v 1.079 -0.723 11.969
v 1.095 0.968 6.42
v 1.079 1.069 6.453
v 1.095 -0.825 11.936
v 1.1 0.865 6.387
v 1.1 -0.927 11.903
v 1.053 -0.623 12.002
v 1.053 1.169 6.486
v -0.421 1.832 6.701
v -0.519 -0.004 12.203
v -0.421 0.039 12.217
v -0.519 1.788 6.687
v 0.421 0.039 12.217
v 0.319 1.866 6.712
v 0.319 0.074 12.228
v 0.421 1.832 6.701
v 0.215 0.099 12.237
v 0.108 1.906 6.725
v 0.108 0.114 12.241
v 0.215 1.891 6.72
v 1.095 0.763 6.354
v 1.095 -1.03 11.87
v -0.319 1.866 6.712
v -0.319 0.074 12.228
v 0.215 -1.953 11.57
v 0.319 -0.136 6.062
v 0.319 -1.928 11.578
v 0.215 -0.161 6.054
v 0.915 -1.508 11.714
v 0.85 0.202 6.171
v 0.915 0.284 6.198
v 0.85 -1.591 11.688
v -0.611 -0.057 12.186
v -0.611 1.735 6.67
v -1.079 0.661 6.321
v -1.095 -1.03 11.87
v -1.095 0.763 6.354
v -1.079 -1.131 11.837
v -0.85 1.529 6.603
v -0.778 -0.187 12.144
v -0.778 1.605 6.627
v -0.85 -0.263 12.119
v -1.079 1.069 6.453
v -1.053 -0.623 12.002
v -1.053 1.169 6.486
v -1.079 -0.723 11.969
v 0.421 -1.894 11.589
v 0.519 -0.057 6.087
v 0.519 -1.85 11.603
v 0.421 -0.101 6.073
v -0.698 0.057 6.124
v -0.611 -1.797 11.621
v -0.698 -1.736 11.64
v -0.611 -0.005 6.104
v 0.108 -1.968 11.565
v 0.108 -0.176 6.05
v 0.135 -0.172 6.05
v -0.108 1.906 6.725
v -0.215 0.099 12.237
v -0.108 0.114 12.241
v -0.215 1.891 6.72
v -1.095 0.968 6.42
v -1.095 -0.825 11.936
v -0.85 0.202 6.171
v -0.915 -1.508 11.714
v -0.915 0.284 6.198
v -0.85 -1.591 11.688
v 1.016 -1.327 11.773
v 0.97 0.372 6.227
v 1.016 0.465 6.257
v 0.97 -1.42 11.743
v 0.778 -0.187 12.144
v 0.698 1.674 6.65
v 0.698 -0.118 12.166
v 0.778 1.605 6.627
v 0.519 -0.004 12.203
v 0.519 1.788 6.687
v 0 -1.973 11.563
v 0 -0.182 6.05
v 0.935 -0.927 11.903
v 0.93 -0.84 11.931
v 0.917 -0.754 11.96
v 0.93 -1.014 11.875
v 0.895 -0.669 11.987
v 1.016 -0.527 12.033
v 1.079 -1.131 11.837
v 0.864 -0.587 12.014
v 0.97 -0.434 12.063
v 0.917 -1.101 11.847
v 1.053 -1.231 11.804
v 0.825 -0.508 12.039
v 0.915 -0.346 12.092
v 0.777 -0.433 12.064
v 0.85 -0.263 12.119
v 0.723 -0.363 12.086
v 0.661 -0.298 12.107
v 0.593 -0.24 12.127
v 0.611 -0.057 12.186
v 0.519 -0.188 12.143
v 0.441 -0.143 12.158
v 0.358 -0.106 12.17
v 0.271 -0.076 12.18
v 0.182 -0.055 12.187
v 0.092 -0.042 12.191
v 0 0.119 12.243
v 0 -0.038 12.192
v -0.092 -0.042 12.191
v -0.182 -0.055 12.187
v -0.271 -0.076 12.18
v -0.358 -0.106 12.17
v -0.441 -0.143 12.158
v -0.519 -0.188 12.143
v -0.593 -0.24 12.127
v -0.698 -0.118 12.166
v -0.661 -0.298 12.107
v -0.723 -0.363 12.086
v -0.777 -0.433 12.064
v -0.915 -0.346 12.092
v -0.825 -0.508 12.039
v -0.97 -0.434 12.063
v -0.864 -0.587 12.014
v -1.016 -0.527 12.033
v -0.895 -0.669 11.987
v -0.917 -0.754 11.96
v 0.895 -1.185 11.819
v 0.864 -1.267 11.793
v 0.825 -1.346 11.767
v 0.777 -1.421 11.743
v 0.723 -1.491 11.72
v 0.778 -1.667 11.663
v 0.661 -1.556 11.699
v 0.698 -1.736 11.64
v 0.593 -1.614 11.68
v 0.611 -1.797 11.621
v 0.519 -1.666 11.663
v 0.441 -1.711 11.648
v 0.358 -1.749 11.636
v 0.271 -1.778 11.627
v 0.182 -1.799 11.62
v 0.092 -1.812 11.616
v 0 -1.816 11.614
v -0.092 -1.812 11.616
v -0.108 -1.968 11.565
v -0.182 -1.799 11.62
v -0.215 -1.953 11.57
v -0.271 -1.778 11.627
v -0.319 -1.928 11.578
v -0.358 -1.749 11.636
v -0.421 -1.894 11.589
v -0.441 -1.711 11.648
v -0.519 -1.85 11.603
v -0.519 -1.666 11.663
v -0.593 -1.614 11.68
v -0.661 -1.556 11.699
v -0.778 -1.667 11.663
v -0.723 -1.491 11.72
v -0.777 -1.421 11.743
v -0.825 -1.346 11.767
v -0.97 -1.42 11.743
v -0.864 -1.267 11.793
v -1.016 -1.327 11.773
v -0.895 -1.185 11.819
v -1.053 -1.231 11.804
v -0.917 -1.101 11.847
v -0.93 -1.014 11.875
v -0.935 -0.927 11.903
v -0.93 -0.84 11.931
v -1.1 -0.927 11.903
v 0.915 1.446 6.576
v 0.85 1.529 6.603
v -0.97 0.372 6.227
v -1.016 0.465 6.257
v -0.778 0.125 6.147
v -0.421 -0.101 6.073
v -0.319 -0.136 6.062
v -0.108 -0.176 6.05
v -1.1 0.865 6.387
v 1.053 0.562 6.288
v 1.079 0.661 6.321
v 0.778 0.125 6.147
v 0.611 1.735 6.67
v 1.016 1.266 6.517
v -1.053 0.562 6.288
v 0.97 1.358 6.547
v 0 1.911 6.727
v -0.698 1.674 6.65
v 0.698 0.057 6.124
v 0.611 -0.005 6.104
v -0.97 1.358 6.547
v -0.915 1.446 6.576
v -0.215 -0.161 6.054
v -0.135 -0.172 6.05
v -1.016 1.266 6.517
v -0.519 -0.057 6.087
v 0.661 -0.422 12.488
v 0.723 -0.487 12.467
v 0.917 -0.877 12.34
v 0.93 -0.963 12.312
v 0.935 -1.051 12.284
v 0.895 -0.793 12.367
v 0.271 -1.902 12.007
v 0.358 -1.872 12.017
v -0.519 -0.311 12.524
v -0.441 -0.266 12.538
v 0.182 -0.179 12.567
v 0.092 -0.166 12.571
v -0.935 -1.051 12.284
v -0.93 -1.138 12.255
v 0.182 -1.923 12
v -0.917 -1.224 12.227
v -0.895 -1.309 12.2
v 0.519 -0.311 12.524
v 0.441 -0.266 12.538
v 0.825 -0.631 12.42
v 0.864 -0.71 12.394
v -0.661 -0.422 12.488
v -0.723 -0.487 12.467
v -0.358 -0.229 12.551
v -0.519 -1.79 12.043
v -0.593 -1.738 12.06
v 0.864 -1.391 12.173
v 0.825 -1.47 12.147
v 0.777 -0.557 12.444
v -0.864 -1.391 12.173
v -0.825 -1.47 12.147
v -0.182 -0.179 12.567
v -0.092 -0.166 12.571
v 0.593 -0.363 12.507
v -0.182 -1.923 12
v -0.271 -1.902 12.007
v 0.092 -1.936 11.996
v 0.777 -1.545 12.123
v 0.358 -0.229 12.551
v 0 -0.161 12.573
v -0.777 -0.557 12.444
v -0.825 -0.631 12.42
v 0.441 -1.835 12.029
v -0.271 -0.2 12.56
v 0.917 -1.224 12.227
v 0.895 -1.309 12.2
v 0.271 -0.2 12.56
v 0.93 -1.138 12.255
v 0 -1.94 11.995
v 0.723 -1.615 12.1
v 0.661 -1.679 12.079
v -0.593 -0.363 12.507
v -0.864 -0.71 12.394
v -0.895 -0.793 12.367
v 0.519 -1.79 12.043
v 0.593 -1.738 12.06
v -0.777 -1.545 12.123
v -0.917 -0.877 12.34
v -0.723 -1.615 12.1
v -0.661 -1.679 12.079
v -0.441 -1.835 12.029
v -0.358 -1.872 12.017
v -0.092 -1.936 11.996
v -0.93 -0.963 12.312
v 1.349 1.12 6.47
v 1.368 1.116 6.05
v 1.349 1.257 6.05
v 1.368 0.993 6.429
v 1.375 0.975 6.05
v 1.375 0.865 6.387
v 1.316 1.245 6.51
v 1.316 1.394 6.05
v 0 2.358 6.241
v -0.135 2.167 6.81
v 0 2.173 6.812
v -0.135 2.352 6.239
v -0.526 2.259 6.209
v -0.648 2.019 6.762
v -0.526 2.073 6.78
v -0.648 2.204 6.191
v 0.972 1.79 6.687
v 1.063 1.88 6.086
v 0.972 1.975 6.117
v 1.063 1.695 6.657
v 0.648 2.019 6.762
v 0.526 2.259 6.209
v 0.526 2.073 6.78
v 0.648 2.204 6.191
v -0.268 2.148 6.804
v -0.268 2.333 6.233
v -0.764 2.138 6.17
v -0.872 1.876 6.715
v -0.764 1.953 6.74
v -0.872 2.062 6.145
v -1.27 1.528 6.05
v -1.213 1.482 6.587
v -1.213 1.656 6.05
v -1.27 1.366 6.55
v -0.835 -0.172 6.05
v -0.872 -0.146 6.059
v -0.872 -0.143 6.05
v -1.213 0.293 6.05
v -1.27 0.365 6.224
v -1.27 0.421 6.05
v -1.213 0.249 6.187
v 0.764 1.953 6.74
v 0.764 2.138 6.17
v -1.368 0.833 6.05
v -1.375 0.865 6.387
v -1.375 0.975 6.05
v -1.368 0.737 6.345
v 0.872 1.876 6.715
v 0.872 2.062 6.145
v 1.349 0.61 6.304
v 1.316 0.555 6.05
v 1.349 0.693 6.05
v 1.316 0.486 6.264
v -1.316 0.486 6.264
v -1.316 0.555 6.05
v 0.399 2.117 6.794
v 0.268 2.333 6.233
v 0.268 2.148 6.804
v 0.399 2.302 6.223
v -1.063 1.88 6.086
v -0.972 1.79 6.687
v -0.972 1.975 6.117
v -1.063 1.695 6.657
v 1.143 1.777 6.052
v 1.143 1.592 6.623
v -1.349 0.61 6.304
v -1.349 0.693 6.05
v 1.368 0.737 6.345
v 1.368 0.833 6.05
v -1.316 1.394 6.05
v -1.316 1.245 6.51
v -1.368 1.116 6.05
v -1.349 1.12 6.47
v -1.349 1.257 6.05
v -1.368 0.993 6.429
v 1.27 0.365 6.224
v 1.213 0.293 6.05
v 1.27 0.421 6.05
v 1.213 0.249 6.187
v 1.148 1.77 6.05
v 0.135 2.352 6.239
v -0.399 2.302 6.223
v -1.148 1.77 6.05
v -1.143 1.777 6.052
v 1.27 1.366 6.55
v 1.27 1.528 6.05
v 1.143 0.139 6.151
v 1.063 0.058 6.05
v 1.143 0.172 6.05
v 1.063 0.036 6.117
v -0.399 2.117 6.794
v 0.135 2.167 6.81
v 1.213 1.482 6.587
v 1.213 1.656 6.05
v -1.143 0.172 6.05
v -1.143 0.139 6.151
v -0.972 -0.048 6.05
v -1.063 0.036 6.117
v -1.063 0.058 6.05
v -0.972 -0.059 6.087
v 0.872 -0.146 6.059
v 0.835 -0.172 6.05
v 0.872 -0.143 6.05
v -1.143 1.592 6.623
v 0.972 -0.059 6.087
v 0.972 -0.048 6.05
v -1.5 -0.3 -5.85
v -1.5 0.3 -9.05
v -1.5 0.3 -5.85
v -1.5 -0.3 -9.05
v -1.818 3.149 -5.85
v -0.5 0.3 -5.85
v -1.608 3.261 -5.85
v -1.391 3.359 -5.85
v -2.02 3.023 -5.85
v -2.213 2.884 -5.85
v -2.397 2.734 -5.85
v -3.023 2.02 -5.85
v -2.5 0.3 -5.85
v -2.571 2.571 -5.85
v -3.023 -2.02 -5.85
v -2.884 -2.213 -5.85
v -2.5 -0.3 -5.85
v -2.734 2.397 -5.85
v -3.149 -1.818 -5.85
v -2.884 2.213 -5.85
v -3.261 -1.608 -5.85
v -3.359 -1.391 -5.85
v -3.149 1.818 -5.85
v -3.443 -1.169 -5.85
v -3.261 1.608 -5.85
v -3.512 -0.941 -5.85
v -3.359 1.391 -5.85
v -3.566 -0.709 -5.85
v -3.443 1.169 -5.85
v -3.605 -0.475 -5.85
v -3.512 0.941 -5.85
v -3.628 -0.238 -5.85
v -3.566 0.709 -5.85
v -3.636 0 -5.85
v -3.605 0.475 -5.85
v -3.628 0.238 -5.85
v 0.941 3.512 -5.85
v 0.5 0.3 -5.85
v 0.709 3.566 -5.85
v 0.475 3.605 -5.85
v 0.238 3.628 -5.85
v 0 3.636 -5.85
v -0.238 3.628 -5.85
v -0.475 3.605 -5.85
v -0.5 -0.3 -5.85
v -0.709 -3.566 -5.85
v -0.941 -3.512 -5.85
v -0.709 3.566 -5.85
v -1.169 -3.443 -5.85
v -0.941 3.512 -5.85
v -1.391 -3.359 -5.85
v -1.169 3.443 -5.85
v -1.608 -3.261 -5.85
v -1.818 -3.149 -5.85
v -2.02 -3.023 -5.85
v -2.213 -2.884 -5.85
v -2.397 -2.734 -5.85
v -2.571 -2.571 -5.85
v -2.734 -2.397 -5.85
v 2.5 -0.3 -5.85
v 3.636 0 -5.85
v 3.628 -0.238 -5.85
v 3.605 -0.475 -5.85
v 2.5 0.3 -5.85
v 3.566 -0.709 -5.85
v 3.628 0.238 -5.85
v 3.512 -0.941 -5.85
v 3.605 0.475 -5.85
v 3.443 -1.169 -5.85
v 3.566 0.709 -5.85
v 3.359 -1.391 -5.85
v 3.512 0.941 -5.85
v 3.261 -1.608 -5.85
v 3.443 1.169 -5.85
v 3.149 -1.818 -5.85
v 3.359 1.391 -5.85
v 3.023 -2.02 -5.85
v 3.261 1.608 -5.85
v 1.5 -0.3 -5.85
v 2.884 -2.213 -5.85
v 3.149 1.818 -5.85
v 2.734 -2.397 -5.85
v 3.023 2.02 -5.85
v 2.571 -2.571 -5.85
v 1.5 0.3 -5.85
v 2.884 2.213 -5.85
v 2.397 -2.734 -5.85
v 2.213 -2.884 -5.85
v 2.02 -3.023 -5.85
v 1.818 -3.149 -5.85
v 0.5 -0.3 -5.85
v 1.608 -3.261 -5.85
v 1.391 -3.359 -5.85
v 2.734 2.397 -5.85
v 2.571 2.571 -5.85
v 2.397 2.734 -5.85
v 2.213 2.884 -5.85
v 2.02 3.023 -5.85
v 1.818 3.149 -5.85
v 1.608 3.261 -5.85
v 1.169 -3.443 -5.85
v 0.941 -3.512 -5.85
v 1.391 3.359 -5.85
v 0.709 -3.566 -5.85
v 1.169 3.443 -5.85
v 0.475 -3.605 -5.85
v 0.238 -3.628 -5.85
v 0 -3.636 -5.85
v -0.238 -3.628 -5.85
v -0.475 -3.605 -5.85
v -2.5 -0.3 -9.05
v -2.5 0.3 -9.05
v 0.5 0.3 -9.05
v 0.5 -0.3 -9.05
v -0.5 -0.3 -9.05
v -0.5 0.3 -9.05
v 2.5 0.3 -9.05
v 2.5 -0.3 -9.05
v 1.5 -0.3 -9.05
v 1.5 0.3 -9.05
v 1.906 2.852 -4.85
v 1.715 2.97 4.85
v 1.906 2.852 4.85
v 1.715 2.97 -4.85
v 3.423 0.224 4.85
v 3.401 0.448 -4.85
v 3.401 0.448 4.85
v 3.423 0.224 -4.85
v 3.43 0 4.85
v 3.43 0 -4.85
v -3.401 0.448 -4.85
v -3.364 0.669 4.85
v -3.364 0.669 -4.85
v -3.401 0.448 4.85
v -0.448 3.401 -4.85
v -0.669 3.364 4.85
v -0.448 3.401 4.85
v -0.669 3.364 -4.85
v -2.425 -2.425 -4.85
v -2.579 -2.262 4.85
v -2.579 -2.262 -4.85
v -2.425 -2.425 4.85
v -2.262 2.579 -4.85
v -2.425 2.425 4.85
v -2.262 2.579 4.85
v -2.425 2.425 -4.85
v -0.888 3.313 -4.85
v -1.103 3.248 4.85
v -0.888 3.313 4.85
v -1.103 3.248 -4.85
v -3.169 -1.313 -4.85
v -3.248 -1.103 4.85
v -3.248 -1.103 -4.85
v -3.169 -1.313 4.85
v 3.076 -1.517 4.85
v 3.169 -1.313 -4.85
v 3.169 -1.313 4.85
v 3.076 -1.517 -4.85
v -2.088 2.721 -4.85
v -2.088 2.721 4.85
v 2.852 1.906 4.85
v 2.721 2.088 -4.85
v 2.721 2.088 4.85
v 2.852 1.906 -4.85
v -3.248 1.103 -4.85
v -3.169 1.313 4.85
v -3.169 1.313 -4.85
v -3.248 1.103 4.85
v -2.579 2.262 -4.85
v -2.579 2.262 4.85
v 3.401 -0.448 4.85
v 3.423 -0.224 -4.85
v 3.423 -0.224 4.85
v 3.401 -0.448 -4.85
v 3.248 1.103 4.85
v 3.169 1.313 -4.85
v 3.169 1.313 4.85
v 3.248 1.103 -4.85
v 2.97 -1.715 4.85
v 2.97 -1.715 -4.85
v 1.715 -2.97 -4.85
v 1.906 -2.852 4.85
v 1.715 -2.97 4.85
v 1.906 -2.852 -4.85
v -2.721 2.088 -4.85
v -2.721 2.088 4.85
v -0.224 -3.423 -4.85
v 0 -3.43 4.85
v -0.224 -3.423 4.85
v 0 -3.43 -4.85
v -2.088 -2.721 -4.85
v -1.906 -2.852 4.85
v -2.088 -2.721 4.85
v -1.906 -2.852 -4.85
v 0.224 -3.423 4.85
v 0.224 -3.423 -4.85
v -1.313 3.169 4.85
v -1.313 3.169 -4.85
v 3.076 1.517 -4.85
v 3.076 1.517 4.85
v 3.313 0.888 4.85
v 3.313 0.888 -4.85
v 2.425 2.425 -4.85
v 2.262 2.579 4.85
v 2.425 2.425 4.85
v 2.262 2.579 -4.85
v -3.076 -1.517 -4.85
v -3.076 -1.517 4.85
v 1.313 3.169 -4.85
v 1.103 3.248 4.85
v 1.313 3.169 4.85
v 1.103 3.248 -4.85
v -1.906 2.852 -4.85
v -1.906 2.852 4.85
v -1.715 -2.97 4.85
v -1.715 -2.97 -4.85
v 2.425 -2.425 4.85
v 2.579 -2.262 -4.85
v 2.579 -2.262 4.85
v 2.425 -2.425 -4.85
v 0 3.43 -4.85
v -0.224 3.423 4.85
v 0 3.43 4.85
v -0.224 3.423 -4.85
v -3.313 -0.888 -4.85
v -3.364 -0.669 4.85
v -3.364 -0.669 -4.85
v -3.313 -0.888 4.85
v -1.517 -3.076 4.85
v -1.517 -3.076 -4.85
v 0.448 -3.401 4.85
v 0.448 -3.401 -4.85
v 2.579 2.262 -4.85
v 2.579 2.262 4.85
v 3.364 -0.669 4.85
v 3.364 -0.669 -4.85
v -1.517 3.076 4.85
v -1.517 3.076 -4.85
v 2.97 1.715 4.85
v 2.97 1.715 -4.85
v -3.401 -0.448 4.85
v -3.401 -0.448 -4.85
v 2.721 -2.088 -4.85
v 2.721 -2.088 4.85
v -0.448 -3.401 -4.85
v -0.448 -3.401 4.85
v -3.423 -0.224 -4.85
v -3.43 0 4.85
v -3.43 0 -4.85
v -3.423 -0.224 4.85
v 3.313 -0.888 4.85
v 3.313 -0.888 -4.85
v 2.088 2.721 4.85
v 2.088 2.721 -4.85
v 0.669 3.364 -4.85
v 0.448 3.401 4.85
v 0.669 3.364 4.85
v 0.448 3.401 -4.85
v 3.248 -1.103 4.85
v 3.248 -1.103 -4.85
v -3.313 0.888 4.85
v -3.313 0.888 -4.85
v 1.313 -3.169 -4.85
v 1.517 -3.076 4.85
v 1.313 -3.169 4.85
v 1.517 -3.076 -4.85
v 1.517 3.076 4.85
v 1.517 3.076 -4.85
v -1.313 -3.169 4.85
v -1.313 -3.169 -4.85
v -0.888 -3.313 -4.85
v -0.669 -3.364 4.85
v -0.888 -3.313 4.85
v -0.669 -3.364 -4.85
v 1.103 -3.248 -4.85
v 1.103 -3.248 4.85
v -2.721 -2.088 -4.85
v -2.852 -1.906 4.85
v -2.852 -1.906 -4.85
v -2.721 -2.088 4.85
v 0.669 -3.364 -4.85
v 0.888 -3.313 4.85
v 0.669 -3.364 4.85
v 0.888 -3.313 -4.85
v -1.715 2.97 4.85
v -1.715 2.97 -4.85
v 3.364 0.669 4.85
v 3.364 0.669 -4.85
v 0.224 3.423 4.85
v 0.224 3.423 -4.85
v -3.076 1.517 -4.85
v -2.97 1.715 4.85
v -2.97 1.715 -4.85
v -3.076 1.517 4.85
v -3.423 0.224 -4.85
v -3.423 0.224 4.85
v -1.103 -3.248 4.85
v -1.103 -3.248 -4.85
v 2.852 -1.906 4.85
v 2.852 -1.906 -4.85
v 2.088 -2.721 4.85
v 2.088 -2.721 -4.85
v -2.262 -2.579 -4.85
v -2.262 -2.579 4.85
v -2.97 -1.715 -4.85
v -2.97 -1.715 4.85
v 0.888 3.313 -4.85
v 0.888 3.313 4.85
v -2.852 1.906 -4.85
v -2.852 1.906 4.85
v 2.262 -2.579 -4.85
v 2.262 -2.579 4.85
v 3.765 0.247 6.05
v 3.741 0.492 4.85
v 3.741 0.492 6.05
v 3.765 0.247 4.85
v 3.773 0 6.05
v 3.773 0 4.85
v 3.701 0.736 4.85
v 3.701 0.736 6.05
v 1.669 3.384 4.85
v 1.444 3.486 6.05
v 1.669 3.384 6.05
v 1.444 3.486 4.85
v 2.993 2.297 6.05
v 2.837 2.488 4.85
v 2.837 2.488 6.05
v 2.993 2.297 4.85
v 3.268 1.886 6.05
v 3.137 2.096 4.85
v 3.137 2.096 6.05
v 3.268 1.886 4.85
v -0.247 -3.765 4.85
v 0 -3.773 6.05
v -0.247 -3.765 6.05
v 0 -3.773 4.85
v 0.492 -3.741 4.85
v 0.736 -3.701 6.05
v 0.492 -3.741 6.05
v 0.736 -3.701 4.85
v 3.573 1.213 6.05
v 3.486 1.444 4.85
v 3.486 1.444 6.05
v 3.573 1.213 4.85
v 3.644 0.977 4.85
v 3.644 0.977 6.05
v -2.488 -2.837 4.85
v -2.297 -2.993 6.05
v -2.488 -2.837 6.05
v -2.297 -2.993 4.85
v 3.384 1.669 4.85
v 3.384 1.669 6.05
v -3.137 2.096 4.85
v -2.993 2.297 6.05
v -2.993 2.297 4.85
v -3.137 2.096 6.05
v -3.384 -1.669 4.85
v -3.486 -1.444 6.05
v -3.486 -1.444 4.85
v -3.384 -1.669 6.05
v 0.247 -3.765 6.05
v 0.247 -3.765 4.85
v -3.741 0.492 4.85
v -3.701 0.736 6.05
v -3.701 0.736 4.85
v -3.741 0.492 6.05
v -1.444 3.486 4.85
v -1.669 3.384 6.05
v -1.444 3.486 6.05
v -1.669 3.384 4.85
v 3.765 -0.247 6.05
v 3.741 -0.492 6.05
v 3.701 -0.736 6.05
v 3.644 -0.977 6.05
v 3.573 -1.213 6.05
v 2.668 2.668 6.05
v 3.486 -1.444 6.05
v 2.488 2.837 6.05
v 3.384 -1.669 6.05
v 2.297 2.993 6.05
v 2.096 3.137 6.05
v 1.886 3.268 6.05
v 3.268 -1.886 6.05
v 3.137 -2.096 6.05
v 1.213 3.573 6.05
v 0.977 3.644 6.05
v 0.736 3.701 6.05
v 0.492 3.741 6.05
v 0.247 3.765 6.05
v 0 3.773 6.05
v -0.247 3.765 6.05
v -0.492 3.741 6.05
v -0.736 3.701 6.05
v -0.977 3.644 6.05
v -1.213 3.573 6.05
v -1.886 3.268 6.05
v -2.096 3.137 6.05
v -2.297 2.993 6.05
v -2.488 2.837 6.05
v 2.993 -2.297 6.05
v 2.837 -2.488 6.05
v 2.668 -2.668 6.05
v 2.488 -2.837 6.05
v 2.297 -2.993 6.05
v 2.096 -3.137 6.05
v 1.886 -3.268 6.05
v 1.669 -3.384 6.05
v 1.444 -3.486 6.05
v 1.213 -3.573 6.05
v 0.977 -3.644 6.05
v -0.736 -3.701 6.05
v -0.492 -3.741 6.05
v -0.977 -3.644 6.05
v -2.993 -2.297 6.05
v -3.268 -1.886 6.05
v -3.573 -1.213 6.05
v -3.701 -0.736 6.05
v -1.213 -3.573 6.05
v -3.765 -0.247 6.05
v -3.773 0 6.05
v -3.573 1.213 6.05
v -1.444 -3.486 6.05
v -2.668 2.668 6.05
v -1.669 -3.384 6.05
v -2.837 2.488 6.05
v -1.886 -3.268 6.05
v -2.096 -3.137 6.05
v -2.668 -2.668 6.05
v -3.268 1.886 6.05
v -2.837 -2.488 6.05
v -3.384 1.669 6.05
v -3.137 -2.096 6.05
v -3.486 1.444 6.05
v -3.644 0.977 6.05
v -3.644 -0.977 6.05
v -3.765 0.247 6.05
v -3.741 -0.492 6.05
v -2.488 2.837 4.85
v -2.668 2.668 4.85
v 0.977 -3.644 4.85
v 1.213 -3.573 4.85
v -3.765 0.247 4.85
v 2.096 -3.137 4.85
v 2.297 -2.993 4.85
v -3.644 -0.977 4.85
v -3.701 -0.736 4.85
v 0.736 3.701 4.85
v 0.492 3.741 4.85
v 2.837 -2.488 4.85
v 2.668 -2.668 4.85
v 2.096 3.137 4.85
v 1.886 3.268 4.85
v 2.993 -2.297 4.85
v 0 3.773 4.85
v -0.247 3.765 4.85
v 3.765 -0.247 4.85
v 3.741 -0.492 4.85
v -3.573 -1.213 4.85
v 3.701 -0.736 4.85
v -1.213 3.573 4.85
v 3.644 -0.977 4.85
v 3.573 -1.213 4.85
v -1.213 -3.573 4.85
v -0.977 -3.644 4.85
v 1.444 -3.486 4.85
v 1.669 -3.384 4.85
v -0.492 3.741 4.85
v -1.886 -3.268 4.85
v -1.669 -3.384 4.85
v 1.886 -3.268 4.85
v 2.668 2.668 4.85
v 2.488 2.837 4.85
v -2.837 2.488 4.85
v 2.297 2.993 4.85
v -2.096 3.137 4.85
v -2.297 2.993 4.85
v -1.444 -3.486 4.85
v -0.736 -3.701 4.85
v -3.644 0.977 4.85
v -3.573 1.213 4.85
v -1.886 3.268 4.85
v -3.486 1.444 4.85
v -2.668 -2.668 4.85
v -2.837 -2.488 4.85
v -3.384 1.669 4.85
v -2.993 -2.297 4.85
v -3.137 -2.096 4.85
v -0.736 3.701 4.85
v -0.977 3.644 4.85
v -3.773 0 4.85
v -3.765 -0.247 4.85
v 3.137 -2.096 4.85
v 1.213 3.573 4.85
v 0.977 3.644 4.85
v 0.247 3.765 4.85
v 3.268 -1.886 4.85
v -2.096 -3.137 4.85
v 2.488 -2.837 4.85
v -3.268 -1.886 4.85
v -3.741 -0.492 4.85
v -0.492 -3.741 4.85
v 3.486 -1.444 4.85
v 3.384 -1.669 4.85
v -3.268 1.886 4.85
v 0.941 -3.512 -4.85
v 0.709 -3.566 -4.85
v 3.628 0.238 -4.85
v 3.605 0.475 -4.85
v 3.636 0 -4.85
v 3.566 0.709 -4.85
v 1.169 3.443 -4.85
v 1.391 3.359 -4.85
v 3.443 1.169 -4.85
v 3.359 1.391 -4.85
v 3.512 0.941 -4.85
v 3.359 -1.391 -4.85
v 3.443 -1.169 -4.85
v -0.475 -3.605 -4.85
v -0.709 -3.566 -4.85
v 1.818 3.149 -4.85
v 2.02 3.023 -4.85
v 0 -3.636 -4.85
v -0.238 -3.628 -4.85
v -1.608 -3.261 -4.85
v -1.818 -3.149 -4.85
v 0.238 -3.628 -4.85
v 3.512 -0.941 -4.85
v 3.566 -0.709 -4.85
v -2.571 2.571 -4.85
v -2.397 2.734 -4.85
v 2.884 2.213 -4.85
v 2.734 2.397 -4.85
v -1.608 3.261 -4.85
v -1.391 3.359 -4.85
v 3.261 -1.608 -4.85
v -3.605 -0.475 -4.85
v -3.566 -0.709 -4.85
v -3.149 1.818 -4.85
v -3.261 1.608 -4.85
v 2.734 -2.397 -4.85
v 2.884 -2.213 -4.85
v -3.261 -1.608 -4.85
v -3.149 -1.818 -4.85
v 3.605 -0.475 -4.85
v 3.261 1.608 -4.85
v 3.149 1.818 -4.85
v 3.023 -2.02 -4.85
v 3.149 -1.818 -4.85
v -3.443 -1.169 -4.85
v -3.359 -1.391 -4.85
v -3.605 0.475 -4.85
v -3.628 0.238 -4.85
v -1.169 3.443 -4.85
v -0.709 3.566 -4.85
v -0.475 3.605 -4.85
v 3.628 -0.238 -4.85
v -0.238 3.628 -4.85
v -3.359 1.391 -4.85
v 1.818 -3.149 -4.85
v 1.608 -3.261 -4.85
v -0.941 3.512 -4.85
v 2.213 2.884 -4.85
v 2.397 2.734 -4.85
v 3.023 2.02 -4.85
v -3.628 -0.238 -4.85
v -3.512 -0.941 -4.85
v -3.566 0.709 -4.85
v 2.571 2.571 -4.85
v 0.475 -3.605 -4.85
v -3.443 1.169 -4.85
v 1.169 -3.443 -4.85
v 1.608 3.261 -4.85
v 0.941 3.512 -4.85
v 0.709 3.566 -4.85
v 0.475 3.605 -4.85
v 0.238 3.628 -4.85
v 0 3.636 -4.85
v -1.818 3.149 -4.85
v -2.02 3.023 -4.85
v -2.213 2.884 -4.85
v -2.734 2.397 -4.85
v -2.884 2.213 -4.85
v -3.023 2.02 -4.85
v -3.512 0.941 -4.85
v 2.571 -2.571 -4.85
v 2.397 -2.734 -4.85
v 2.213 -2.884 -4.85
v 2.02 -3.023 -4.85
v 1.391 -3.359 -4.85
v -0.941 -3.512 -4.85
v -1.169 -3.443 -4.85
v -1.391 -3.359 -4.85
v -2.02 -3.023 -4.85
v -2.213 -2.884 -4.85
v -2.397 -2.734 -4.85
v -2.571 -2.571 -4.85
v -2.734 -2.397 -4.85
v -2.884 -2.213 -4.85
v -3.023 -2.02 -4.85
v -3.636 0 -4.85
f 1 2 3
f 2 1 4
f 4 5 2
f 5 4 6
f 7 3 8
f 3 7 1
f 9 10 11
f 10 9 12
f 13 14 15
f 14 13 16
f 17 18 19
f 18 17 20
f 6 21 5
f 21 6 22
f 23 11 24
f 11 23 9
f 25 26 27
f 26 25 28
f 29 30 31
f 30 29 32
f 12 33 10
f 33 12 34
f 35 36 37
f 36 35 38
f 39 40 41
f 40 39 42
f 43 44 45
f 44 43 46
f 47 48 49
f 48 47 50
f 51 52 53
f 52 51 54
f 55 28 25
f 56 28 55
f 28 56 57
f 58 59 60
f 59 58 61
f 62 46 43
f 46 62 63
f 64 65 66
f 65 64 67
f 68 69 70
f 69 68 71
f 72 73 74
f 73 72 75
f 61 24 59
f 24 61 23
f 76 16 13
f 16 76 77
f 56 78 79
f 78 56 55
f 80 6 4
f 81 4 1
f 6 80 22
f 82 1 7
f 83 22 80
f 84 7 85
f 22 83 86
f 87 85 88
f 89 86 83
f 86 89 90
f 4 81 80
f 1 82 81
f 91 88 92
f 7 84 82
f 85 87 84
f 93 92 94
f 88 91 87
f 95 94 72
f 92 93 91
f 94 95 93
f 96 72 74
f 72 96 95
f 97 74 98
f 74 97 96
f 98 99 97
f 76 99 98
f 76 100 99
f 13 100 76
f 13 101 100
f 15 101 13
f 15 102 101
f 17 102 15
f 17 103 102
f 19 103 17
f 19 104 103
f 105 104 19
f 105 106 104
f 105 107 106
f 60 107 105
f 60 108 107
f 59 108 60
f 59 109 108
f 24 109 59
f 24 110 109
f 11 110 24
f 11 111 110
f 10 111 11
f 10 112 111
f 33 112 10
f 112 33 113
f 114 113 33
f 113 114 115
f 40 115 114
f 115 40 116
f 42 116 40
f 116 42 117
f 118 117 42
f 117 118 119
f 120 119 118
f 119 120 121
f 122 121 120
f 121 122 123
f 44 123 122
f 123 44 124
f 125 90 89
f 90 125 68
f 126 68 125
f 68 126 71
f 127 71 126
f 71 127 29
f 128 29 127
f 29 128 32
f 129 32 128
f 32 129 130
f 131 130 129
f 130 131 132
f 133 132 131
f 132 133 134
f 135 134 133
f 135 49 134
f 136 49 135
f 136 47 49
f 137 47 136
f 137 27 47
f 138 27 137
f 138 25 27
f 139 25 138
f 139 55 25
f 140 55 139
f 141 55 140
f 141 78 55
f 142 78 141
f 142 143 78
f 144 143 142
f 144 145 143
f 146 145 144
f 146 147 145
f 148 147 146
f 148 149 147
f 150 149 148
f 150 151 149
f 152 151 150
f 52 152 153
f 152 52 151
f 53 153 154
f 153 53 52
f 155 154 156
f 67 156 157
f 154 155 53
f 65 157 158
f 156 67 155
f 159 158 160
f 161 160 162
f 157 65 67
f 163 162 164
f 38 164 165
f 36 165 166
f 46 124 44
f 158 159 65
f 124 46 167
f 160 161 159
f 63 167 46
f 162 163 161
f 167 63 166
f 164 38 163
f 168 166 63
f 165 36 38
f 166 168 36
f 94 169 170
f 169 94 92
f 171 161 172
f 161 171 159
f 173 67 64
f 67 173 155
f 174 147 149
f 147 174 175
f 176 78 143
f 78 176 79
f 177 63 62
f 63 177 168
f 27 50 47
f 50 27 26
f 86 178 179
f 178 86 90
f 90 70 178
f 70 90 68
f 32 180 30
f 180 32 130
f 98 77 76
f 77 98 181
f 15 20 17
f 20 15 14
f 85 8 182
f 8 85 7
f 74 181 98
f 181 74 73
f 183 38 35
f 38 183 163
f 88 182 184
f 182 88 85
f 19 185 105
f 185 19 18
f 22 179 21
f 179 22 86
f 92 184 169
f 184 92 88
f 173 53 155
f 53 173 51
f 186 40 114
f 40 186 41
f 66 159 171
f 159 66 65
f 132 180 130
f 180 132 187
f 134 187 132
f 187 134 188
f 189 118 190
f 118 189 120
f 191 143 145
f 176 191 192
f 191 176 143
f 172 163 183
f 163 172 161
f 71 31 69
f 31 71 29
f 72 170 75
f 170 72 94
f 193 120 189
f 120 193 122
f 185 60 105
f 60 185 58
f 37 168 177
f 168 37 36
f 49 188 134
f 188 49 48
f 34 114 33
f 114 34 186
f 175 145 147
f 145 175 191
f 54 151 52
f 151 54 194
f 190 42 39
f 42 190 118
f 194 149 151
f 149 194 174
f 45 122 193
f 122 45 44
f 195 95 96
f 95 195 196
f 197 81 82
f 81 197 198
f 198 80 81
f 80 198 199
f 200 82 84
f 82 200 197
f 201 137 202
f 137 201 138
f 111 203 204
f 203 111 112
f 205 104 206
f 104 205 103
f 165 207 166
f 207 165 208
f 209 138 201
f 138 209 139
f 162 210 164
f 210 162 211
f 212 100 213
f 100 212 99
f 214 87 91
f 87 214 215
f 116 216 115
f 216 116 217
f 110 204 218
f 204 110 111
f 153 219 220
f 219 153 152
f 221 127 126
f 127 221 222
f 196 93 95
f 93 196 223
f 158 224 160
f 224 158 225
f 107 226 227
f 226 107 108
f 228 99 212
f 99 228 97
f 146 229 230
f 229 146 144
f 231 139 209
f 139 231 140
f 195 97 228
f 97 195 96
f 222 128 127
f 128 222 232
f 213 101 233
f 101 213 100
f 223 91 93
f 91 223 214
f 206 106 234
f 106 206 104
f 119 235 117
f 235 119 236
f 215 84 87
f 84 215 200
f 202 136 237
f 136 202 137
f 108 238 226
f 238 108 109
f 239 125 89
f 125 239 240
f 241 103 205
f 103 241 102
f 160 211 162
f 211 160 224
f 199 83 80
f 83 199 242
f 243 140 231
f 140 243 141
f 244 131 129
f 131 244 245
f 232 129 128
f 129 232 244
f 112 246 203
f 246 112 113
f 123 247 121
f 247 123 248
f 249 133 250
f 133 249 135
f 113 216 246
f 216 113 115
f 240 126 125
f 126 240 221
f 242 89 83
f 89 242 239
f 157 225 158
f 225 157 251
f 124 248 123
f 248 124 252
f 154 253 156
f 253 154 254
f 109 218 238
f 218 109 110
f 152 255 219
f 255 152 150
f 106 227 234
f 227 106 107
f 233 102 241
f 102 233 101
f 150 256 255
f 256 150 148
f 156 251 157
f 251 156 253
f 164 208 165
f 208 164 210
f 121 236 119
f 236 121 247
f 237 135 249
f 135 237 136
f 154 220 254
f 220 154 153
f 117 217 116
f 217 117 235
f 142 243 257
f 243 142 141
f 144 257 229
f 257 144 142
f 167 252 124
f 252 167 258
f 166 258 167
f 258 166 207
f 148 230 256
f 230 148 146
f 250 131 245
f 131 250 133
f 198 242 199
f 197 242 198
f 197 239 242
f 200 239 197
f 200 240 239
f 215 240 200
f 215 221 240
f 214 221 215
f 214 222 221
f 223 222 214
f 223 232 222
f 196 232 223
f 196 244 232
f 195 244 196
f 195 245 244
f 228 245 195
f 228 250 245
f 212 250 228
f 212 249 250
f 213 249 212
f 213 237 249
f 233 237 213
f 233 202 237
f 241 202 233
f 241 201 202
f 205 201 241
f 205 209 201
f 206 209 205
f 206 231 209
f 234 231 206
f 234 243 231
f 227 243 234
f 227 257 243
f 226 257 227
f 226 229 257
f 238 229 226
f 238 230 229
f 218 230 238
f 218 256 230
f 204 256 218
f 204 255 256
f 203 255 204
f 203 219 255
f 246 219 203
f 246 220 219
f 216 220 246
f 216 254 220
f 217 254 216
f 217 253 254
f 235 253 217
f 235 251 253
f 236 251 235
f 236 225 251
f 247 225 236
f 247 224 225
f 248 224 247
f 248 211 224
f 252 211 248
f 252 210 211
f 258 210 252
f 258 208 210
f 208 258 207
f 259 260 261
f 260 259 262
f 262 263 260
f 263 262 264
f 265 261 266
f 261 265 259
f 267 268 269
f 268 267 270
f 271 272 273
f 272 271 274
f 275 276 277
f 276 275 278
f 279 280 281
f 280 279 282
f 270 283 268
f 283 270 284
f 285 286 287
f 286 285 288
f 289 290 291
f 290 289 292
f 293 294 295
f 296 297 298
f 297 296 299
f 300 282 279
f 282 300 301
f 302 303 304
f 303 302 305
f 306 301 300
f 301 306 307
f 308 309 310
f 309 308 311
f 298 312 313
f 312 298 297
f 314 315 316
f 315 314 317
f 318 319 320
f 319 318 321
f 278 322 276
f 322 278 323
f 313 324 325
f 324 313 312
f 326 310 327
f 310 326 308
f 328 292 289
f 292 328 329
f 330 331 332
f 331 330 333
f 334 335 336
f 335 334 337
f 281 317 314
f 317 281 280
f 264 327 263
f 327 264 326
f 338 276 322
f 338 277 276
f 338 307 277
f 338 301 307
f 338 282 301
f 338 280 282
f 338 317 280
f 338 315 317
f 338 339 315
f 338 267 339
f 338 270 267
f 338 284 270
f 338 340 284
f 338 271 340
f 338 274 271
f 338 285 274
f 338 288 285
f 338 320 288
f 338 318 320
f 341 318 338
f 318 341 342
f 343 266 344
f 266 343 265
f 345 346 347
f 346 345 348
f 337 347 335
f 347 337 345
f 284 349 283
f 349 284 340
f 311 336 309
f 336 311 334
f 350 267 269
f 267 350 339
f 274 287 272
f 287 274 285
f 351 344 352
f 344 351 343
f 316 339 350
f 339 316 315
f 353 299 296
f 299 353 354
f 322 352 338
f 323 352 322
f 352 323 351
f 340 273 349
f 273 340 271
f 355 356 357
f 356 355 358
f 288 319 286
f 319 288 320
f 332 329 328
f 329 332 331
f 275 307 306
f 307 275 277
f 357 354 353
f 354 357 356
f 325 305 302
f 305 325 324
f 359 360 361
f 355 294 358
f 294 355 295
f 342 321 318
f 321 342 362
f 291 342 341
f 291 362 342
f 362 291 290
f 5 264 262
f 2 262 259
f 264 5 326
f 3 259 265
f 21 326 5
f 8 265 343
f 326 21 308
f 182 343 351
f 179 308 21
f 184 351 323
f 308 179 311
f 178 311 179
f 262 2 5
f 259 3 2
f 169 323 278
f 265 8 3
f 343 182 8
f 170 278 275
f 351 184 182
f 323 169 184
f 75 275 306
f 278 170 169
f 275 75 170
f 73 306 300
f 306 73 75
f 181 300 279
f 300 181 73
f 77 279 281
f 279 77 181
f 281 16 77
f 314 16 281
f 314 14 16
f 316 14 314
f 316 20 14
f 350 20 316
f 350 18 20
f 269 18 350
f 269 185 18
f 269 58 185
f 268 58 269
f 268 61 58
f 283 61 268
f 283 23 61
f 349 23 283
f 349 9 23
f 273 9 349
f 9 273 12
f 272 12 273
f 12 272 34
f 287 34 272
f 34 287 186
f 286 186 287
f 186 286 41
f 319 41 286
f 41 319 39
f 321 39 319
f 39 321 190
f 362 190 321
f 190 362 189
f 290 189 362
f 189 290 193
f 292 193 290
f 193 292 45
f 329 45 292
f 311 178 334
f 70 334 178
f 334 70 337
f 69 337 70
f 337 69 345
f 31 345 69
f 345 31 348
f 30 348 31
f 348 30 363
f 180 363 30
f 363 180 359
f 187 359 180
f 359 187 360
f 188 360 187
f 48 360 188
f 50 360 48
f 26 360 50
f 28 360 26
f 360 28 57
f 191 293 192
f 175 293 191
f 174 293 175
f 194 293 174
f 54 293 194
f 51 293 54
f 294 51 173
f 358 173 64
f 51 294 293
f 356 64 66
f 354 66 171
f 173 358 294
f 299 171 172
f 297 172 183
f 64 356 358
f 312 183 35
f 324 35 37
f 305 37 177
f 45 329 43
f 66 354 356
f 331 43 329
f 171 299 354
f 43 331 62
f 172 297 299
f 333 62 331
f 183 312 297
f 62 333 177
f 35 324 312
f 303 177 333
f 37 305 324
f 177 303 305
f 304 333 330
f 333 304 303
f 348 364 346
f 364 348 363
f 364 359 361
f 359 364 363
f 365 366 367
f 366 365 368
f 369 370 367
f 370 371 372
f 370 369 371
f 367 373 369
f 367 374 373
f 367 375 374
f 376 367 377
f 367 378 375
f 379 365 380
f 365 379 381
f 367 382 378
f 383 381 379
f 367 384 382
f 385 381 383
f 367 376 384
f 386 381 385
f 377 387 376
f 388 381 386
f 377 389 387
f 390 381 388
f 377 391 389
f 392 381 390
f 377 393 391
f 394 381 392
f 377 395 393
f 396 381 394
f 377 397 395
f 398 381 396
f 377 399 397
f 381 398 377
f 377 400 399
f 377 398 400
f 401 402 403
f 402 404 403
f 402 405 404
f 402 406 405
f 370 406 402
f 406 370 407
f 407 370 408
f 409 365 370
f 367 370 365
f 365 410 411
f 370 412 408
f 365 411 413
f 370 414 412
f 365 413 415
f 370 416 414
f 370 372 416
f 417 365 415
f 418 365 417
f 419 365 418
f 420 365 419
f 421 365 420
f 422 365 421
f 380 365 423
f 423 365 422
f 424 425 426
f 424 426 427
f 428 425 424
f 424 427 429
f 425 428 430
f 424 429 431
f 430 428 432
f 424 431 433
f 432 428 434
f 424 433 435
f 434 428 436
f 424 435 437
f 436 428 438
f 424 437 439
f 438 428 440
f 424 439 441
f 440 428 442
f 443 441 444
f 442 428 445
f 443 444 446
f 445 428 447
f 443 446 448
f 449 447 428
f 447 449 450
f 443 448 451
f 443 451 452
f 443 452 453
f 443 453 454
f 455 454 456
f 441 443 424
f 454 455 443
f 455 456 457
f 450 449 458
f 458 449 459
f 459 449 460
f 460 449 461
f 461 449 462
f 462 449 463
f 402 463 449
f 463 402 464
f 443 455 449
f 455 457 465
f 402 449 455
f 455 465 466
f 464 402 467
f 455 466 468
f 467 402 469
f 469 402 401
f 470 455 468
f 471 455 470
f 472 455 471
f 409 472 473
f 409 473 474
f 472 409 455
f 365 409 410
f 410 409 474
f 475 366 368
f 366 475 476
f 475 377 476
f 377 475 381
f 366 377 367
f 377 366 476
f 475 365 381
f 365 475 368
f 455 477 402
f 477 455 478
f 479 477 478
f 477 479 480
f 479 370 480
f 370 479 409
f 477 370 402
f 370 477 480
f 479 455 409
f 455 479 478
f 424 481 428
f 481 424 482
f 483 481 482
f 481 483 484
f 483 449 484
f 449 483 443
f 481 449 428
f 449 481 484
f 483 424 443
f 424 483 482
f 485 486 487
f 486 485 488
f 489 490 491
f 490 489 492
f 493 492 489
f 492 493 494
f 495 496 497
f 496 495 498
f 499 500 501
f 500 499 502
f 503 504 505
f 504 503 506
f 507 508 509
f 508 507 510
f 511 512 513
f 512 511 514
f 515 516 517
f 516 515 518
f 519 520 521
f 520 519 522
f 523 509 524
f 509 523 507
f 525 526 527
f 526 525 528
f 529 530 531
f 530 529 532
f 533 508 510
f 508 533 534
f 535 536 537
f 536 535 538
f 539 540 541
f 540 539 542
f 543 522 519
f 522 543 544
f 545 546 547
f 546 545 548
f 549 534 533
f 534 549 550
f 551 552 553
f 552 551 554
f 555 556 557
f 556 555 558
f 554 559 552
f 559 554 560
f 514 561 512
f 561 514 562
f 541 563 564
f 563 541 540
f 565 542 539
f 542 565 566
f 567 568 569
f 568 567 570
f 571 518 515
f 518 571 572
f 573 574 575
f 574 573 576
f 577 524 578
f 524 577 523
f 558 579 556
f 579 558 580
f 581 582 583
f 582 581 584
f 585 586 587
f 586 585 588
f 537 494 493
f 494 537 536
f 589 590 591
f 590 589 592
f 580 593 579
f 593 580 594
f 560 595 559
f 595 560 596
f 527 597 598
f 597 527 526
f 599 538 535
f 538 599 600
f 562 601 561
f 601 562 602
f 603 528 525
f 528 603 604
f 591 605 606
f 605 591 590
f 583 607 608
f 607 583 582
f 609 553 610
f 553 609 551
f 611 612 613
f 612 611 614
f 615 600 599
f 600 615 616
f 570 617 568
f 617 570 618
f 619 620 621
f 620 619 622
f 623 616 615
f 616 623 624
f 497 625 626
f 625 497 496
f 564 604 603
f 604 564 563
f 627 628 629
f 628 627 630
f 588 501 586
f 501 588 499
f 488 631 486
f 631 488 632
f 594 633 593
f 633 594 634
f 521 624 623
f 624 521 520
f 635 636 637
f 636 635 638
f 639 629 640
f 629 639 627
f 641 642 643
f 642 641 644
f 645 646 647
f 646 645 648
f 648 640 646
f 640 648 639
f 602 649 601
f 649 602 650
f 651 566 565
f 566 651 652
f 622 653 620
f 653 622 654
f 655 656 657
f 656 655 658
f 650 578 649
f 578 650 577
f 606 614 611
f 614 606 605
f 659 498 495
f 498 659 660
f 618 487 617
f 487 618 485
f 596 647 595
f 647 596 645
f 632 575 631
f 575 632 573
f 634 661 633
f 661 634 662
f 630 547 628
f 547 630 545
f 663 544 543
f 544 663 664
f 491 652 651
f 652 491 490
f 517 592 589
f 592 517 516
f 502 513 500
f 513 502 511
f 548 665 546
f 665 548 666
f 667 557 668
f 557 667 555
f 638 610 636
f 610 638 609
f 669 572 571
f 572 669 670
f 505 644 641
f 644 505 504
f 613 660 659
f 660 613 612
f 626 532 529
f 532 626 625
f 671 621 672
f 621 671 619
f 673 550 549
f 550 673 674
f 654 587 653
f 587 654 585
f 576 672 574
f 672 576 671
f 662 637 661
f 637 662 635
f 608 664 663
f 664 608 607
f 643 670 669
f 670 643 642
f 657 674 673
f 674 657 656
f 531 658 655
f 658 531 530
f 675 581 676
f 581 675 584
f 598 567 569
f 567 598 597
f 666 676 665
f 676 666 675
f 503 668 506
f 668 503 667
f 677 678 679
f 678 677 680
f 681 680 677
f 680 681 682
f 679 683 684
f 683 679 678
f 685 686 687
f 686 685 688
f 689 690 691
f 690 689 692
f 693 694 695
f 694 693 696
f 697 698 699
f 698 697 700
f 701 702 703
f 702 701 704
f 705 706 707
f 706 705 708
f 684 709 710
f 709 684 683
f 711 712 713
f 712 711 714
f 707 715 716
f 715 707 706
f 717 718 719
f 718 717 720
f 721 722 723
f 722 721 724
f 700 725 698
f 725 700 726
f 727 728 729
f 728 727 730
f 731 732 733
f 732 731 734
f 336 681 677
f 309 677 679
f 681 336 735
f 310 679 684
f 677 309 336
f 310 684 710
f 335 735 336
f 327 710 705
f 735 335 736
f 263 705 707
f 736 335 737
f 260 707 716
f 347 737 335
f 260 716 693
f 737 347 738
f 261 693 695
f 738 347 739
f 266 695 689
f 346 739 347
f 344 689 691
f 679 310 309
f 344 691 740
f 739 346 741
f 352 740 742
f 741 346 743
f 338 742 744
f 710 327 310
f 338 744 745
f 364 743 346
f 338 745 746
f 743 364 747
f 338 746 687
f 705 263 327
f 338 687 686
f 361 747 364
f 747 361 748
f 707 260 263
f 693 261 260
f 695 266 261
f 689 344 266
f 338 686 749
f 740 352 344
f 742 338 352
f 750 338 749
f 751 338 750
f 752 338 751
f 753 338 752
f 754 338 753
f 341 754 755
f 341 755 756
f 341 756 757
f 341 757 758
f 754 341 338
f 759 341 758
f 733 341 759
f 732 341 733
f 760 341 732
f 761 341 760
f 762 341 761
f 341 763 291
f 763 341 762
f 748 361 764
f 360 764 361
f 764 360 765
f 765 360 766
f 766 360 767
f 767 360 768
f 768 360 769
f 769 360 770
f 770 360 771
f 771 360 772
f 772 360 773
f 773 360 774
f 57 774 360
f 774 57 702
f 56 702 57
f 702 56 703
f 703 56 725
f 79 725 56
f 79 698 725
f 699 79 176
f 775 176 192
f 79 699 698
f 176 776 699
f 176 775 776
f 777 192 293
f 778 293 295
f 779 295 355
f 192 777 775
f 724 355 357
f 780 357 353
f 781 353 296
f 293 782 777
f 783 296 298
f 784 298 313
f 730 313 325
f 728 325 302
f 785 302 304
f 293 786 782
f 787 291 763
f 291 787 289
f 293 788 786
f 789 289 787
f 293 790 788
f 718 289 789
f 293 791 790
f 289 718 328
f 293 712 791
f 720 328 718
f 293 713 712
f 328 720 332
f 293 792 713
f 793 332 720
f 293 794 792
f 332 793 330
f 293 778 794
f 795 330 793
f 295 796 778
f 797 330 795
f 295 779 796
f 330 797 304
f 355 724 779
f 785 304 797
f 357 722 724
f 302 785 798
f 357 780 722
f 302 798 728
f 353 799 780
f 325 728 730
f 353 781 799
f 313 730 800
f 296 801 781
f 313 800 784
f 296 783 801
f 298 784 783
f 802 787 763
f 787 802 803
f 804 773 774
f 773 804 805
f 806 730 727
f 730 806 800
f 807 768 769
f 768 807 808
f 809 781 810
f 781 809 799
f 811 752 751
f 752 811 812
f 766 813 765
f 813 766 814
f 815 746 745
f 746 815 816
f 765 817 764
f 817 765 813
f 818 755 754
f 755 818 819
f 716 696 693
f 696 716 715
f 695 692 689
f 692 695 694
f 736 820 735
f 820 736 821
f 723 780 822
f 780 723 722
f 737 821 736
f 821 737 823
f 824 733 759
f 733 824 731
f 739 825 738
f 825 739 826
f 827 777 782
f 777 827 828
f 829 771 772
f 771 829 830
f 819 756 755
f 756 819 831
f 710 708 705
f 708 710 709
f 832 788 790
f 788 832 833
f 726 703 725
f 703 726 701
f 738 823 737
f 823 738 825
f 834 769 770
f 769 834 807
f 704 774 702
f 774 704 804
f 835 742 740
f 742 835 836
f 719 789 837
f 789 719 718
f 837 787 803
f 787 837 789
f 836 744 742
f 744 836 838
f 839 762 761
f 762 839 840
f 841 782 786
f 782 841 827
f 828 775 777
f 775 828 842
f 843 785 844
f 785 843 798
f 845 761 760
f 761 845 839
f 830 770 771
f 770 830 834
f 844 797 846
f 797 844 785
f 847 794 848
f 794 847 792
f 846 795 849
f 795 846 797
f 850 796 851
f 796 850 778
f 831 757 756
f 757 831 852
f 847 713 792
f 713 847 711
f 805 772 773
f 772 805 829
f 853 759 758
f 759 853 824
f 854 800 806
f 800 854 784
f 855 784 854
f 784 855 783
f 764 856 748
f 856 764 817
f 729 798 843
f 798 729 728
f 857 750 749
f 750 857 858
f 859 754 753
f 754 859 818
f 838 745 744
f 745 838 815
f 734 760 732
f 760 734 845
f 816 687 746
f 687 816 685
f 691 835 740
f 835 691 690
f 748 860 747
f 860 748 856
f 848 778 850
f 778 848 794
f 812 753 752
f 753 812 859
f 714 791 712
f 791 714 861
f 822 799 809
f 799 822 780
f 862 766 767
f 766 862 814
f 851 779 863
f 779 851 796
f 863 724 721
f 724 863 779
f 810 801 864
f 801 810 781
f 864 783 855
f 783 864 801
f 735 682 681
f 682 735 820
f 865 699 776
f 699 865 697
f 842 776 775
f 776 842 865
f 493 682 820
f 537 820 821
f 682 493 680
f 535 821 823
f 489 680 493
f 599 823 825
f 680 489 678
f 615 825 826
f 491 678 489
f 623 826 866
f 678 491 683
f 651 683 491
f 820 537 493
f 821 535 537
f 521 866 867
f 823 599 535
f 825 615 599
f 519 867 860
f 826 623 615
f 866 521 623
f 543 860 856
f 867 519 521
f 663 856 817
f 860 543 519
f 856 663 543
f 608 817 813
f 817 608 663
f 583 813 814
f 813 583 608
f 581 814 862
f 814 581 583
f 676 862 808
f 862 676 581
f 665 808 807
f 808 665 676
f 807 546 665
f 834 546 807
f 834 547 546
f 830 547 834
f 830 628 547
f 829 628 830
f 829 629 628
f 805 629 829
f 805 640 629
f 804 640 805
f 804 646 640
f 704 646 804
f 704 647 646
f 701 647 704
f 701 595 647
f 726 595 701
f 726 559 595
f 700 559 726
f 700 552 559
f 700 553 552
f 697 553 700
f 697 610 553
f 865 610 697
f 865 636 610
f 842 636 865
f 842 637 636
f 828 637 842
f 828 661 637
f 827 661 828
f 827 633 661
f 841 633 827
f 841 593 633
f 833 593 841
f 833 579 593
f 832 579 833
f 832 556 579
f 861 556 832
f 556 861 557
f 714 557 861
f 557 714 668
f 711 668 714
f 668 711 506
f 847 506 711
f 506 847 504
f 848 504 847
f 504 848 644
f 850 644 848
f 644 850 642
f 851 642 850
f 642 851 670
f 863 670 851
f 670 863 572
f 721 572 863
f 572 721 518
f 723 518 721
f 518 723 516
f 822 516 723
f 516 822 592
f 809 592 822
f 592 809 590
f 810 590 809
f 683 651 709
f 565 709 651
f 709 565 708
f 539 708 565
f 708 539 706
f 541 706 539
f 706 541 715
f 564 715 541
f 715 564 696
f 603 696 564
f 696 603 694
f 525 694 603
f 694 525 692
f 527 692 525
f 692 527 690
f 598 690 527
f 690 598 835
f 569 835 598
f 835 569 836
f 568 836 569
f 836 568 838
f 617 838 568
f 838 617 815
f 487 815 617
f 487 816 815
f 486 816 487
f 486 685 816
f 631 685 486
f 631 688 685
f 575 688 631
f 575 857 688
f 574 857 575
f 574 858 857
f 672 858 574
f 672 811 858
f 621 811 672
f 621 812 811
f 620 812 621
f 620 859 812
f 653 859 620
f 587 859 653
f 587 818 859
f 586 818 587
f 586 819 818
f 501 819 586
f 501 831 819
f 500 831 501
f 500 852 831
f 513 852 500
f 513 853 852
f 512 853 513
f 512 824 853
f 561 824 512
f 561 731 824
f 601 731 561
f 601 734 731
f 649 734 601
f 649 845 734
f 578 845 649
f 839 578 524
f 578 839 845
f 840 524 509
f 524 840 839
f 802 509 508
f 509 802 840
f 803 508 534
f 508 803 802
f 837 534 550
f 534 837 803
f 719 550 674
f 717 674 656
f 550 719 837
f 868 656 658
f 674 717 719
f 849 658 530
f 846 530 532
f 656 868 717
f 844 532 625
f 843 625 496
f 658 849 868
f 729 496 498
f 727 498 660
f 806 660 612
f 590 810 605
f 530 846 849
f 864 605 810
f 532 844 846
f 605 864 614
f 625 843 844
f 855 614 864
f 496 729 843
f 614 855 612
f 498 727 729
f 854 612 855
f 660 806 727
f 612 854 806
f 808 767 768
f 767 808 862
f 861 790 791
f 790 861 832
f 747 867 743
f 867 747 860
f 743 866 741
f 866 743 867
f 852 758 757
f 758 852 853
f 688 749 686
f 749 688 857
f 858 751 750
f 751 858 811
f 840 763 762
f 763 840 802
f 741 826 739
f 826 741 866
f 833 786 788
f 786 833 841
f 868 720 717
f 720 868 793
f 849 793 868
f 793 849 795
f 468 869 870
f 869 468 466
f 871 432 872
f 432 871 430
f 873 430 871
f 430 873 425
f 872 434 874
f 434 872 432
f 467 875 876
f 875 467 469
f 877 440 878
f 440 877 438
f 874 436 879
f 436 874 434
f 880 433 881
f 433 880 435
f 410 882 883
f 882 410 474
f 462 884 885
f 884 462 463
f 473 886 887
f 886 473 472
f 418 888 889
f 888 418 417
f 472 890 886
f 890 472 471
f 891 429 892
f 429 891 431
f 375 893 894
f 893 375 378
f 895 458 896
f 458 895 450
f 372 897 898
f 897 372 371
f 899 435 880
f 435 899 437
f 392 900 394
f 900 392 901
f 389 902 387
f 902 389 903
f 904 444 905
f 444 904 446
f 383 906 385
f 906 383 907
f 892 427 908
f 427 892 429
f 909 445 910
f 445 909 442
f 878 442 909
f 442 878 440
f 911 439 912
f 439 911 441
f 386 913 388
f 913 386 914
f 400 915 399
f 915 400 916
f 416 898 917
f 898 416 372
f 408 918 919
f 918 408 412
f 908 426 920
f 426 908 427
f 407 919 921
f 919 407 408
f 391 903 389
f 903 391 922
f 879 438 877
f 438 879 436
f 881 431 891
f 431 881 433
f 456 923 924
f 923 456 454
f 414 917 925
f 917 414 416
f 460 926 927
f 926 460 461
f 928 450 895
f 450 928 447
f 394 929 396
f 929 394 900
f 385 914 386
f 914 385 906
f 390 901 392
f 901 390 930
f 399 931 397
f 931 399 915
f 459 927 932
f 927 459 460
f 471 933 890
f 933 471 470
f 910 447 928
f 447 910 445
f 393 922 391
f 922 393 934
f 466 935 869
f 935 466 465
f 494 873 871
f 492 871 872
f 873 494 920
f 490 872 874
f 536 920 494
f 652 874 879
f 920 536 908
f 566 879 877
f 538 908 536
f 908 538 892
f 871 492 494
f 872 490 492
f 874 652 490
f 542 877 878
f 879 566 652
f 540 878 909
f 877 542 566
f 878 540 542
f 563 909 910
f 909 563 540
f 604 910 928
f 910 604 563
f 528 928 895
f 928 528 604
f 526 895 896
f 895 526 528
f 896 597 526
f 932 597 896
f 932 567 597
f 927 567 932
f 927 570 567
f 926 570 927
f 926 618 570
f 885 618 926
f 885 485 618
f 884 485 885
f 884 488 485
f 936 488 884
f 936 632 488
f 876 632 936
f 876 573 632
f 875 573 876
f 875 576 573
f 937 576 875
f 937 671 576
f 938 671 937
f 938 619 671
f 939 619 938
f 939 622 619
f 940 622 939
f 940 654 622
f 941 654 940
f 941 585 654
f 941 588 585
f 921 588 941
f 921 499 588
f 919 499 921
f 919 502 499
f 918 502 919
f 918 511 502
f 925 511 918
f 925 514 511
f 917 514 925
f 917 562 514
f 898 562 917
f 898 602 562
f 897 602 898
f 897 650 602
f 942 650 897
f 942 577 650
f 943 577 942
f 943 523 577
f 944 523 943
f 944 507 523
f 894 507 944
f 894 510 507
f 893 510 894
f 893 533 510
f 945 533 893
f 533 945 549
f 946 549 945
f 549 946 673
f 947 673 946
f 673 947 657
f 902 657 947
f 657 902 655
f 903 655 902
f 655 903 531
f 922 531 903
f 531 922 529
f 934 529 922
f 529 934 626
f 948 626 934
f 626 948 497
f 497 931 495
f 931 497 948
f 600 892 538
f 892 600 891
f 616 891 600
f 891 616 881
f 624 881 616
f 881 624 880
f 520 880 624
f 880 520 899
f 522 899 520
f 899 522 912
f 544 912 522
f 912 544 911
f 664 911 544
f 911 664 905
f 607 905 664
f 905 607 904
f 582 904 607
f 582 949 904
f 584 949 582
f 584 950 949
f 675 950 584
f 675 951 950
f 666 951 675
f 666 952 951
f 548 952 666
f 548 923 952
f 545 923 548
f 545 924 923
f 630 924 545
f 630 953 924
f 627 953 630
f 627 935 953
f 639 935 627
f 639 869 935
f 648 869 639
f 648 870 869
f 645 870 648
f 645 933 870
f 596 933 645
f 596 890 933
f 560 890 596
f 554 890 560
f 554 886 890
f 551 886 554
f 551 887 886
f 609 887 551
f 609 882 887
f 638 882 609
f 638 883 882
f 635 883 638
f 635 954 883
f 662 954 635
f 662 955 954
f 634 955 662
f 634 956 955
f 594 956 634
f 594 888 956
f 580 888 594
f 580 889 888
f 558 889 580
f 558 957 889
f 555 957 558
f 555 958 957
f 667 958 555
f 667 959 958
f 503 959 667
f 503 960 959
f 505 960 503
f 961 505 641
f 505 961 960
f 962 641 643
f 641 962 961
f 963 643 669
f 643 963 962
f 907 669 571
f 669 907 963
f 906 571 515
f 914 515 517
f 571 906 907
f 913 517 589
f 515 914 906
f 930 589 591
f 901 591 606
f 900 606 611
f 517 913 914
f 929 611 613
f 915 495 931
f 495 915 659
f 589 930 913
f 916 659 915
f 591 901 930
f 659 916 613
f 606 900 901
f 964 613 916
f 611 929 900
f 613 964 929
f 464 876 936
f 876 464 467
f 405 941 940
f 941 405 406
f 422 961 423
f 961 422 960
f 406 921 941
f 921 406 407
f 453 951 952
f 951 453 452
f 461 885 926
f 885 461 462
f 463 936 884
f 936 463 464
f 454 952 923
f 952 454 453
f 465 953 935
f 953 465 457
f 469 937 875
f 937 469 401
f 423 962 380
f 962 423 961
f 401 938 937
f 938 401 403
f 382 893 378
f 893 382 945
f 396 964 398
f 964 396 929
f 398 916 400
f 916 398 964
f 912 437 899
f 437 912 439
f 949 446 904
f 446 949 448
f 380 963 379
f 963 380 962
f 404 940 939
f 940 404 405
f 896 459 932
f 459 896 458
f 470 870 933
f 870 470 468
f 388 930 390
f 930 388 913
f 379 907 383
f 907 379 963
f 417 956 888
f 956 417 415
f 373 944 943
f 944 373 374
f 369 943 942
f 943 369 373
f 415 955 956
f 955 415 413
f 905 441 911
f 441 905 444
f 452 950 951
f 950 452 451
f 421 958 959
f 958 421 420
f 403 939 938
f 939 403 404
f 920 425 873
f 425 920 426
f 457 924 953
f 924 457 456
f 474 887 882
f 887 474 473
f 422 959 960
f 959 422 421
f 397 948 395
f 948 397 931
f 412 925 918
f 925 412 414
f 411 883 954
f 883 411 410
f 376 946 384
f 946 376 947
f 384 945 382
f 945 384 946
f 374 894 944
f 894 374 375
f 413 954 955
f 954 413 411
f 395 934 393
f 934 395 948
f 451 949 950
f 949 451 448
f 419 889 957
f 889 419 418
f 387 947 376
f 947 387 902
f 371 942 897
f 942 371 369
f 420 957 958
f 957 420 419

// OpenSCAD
// Toggle switch (stylized) — 6.86mm body diameter, 12.7mm tall
// One connected solid; all placements derived from dimensions (no arbitrary offsets).

// Parameters
body_diameter_mm = 6.86; //[3.43:13.72:0.01]
body_height_mm   = 12.7; //[6.35:25.4:0.01]

include_lever = 1; //[0:1:1]
include_terminals = 1; //[0:1:1]

overlap_mm = 0.4; //[0.1:1.5:0.05]

// Body detailing
top_bezel_h_mm = 1.2; //[0.5:3:0.05]
top_bezel_d_scale = 1.10; //[1.0:1.3:0.01]
bottom_base_h_mm = 1.0; //[0.5:3:0.05]
bottom_base_d_scale = 1.06; //[1.0:1.3:0.01]

// Lever
toggle_lever_diameter_mm = 2.2; //[1.2:5:0.1]
toggle_lever_height_mm   = 6.0; //[3:12:0.1]
lever_tip_d_scale = 0.85; //[0.6:1.0:0.01]
lever_tilt_deg = 18; //[0:35:1]

// Terminals (simple 3-pin)
terminal_count = 3; //[2:6:1]
terminal_w_mm = 1.0; //[0.6:2.0:0.05]
terminal_t_mm = 0.6; //[0.4:1.5:0.05]
terminal_h_mm = 3.2; //[1.5:8:0.1]
terminal_spacing_mm = 2.0; //[1.2:3.5:0.05]
terminal_inset_mm = 0.6; //[0.2:2.0:0.05]

$fn = 96;

module toggle_switch() {
    body_r = body_diameter_mm/2;

    // Keep overall height exactly body_height_mm:
    // core + bezel + base = body_height_mm
    core_h = max(0.01, body_height_mm - top_bezel_h_mm - bottom_base_h_mm);

    // Z references (centered model)
    z_core_center   = 0;
    z_core_top      = z_core_center + core_h/2;
    z_core_bottom   = z_core_center - core_h/2;

    // Bezel/base centers (ensure overlap into core so it's one connected solid)
    z_top_bezel_center    = z_core_top + top_bezel_h_mm/2 - overlap_mm;
    z_bottom_base_center  = z_core_bottom - bottom_base_h_mm/2 + overlap_mm;

    // True outer surfaces (used for attachments)
    z_top_surface    = z_core_top + top_bezel_h_mm;        // top of bezel (no overlap)
    z_bottom_surface = z_core_bottom - bottom_base_h_mm;   // bottom of base (no overlap)

    // Lever placement: base of lever intersects bezel by overlap_mm
    z_lever_center = (z_top_surface - overlap_mm) + toggle_lever_height_mm/2;

    // Terminals placement: top of terminals intersects base by overlap_mm
    z_term_center = (z_bottom_surface + overlap_mm) - terminal_h_mm/2;

    union() {
        // Core body
        cylinder(r=body_r, h=core_h, center=true);

        // Top bezel
        translate([0,0,z_top_bezel_center])
            cylinder(r=body_r*top_bezel_d_scale, h=top_bezel_h_mm, center=true);

        // Bottom base
        translate([0,0,z_bottom_base_center])
            cylinder(r=body_r*bottom_base_d_scale, h=bottom_base_h_mm, center=true);

        // Lever (tilted about X, but positioned so it still intersects the bezel)
        if (include_lever) {
            translate([0,0,z_lever_center])
                rotate([lever_tilt_deg, 0, 0])
                    union() {
                        // Main shaft
                        cylinder(r=toggle_lever_diameter_mm/2, h=toggle_lever_height_mm, center=true, $fn=64);

                        // Tip
                        tip_h = toggle_lever_height_mm*0.22;
                        translate([0,0, toggle_lever_height_mm/2 - tip_h/2 + overlap_mm])
                            cylinder(r=(toggle_lever_diameter_mm*lever_tip_d_scale)/2,
                                     h=tip_h, center=true, $fn=64);

                        // Collar at base (also helps guarantee connection)
                        collar_h = 0.6;
                        translate([0,0, -toggle_lever_height_mm/2 + collar_h/2 - overlap_mm])
                            cylinder(r=(toggle_lever_diameter_mm*1.25)/2, h=collar_h, center=true, $fn=64);
                    }
        }

        // Terminals (rectangular pins) — connected to bottom base
        if (include_terminals) {
            for (i = [0:terminal_count-1]) {
                x = (i - (terminal_count-1)/2) * terminal_spacing_mm;

                // Clamp within body envelope (derived from dimensions)
                x_limit = max(0, body_r - terminal_w_mm/2 - terminal_inset_mm);
                x_clamped = (abs(x) > x_limit) ? sign(x) * x_limit : x;

                translate([x_clamped, 0, z_term_center])
                    cube([terminal_w_mm, terminal_t_mm, terminal_h_mm], center=true);
            }
        }
    }
}

toggle_switch();
